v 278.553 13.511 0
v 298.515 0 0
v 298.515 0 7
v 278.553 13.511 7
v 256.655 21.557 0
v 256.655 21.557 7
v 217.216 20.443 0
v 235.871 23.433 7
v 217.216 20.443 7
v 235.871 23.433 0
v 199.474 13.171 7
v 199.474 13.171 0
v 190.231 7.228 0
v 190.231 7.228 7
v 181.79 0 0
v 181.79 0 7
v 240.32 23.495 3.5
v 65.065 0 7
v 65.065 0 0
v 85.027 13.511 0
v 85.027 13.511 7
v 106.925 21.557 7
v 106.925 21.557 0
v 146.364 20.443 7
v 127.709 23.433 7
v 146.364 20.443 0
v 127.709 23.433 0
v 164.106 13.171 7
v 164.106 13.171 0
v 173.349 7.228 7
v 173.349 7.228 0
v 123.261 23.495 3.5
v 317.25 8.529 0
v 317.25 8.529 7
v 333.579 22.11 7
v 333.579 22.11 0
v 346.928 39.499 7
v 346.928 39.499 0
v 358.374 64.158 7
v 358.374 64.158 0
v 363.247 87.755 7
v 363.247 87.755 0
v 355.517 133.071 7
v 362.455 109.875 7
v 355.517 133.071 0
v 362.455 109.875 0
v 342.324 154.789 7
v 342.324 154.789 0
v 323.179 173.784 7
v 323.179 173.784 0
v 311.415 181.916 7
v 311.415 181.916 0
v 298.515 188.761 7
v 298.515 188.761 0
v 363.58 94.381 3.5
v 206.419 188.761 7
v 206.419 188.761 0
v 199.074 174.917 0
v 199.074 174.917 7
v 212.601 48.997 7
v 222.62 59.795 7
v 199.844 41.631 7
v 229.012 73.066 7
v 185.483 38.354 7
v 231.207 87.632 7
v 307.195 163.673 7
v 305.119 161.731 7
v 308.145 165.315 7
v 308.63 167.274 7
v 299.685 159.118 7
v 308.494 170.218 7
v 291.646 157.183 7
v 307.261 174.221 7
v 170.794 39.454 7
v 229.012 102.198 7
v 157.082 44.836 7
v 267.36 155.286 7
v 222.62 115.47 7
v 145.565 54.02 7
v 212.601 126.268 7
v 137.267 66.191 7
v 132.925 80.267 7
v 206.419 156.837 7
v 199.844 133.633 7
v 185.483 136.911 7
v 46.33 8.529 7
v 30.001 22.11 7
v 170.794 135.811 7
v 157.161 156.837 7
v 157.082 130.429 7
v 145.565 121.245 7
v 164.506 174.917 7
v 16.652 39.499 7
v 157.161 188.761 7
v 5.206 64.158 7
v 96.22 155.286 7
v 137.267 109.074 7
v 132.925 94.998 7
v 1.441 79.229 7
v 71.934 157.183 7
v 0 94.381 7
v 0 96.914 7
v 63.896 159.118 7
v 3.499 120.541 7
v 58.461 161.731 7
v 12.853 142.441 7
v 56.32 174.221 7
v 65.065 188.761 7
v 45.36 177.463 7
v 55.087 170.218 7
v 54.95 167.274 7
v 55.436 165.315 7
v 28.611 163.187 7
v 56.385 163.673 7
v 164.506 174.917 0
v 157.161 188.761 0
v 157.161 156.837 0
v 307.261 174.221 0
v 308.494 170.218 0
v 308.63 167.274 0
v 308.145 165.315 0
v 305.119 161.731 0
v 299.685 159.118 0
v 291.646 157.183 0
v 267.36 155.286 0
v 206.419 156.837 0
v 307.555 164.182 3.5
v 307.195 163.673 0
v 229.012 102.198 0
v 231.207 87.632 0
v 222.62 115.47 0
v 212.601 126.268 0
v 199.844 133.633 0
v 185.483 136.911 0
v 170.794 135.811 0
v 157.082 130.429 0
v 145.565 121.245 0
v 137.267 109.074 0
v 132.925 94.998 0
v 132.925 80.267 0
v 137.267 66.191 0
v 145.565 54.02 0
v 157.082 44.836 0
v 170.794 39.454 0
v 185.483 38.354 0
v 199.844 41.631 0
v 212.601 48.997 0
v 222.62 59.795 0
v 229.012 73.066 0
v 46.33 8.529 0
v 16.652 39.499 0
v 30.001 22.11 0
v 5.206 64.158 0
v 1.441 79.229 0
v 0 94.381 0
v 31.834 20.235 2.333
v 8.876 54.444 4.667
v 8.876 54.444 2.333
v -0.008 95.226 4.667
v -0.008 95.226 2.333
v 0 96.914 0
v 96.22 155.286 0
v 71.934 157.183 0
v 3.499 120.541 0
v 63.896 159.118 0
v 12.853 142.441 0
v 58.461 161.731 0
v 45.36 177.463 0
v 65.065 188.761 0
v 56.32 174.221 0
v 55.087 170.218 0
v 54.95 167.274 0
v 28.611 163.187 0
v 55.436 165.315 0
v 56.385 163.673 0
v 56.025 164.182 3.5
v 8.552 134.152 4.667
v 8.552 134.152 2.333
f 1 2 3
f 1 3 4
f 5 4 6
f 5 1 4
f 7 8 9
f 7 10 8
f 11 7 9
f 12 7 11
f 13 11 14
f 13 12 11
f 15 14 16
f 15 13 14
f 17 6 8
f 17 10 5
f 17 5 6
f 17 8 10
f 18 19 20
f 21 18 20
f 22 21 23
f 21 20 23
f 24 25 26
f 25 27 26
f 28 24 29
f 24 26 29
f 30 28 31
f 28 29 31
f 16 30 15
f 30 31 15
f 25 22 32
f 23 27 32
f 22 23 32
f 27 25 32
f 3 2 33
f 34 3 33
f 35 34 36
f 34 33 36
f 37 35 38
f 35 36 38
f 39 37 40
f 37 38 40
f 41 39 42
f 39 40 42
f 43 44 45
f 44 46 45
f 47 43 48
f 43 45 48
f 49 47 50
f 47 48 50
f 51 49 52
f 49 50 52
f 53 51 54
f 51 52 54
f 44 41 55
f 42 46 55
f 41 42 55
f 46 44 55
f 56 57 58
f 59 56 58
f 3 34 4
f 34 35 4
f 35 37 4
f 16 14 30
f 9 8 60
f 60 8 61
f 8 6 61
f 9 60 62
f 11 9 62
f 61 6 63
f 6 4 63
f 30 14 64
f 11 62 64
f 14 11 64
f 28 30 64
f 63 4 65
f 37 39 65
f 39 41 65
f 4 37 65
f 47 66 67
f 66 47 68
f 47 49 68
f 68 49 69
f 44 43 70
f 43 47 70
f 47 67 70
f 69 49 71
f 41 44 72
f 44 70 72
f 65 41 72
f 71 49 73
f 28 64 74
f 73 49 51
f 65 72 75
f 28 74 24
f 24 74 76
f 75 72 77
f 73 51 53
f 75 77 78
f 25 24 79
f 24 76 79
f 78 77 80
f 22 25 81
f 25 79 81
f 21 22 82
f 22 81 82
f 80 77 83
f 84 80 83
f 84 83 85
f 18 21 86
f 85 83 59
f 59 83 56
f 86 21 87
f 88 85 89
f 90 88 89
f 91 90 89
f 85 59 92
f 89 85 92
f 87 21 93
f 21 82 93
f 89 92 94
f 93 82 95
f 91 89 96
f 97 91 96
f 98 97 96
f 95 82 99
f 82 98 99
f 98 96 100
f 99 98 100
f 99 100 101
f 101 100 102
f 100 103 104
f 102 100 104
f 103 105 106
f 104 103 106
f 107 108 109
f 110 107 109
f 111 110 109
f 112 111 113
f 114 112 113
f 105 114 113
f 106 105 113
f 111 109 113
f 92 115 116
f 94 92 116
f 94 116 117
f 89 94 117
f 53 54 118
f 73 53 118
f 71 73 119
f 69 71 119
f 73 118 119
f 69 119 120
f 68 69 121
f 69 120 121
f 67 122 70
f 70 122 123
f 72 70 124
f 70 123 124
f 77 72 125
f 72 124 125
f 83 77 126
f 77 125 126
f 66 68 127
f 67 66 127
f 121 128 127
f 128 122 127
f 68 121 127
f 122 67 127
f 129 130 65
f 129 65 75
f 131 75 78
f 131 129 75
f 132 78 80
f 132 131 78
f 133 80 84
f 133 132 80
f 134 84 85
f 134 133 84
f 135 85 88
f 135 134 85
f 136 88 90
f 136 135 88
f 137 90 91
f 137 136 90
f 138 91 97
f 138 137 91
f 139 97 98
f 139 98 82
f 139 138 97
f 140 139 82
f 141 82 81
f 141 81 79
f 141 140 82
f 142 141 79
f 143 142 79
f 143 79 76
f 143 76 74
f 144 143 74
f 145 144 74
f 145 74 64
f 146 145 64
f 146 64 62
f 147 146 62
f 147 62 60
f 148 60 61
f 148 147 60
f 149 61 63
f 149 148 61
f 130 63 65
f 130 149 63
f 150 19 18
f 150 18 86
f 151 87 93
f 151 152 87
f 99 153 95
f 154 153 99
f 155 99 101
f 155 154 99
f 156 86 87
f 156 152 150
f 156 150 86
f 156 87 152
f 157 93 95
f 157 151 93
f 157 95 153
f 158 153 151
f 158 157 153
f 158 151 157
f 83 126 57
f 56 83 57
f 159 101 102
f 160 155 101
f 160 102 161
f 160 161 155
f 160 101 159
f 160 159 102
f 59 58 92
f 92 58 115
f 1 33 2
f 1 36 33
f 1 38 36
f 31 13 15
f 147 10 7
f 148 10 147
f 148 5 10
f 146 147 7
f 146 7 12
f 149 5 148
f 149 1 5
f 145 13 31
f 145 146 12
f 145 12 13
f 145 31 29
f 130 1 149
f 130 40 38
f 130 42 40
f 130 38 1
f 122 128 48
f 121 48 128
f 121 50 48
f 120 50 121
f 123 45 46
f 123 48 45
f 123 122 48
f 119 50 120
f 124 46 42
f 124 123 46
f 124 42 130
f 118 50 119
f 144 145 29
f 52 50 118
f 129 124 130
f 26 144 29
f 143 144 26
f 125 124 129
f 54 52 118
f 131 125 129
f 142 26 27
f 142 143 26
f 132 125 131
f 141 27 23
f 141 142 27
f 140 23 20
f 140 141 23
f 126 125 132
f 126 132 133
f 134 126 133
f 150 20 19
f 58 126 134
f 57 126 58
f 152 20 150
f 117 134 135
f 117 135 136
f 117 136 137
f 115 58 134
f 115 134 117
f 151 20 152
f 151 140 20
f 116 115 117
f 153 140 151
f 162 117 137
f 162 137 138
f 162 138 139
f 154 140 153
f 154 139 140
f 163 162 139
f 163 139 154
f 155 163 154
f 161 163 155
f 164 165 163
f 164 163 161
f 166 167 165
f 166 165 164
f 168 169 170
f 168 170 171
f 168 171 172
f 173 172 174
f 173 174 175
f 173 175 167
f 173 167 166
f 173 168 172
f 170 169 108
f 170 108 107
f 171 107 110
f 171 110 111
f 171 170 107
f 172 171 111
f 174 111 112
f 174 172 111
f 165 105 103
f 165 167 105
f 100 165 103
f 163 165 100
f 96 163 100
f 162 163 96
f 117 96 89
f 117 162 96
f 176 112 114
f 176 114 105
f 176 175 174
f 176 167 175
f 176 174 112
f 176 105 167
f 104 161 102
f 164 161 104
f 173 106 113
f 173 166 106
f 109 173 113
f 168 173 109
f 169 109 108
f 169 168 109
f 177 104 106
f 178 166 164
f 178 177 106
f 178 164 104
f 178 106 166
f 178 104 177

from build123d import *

# Parameters (mm, degrees)
F0_R     = 49.4170811362
F1_DEPTH = 7


with BuildPart() as f1:
    # F0 (on Top) → F1 (new body)
    with BuildSketch(Plane.XY):
        with BuildLine():
            add(Edge.make_bspline(
                [(0, 94.3807365658), (-0.0119379338, 95.2269886433), (-0.0118946907, 96.0715546279), (0, 96.9142982709)],
                knots=[0.5, 0.5, 0.5, 0.5, 0.5105644323, 0.5105644323, 0.5105644323, 0.5105644323], degree=3))
            Line((0, 94.3807365658), (0, 96.9142982709))
        make_face()
        with BuildLine():
            Line((0, 96.9142982709), (0, 94.3807365658))
            add(Edge.make_bspline(
                [(65.0650430471, 0), (27.9678273946, 10.5000054464), (0.565005932, 54.3287935629), (0, 94.3807365658)],
                knots=[0, 0, 0, 0, 0.5, 0.5, 0.5, 0.5], degree=3))
            add(Edge.make_bspline(
                [(65.0650430471, 0), (81.994375859, 14.4372666979), (122.6522566992, 31.9710162807), (165.9505028095, 15.6042415748), (181.7901432514, 0)],
                knots=[0, 0, 0, 0, 0.4993848001, 1, 1, 1, 1], degree=3))
            add(Edge.make_bspline(
                [(298.5152434558, 0), (281.5859106439, 14.4372666979), (240.9280298036, 31.9710162807), (197.6297836934, 15.6042415748), (181.7901432514, 0)],
                knots=[0, 0, 0, 0, 0.4993848001, 1, 1, 1, 1], degree=3))
            add(Edge.make_bspline(
                [(298.5152434558, 0), (335.6124591082, 10.5000054464), (390.4181020334, 98.1575816793), (337.8724828362, 170.7077774581), (298.5152434558, 188.7614731316)],
                knots=[0, 0, 0, 0, 0.5, 1, 1, 1, 1], degree=3))
            add(Edge.make_bspline(
                [(298.5152434558, 188.7614731316), (304.9228074129, 179.3974646966), (323.9386038821, 151.6077961536), (253.2731908086, 154.7519554988), (206.4191997051, 156.8366587162)],
                knots=[0, 0, 0, 0, 0.336960062, 1, 1, 1, 1], degree=3))
            Line((206.4191997051, 156.8366587162), (206.4191997051, 188.7614731316))
            Line((206.4191997051, 188.7614731316), (199.0741193295, 174.9168634415))
            Line((199.0741193295, 174.9168634415), (181.7901432514, 174.9168634415))
            Line((181.7901432514, 174.9168634415), (164.5061671734, 174.9168634415))
            Line((164.5061671734, 174.9168634415), (157.1610867977, 188.7614731316))
            Line((157.1610867977, 188.7614731316), (157.1610867977, 156.8366587162))
            add(Edge.make_bspline(
                [(65.0650430471, 188.7614731316), (58.65747909, 179.3974646966), (39.6416826207, 151.6077961536), (110.3070956942, 154.7519554988), (157.1610867977, 156.8366587162)],
                knots=[0, 0, 0, 0, 0.336960062, 1, 1, 1, 1], degree=3))
            add(Edge.make_bspline(
                [(0, 96.9142982709), (0.551064605, 135.9574482655), (26.5393774454, 171.0892315481), (65.0650430471, 188.7614731316)],
                knots=[0.5105644323, 0.5105644323, 0.5105644323, 0.5105644323, 1, 1, 1, 1], degree=3))
        make_face()
        with Locations((181.7901432514, 87.6324102283)):
            Circle(F0_R, mode=Mode.SUBTRACT)
    extrude(amount=F1_DEPTH)


solid = f1.part
